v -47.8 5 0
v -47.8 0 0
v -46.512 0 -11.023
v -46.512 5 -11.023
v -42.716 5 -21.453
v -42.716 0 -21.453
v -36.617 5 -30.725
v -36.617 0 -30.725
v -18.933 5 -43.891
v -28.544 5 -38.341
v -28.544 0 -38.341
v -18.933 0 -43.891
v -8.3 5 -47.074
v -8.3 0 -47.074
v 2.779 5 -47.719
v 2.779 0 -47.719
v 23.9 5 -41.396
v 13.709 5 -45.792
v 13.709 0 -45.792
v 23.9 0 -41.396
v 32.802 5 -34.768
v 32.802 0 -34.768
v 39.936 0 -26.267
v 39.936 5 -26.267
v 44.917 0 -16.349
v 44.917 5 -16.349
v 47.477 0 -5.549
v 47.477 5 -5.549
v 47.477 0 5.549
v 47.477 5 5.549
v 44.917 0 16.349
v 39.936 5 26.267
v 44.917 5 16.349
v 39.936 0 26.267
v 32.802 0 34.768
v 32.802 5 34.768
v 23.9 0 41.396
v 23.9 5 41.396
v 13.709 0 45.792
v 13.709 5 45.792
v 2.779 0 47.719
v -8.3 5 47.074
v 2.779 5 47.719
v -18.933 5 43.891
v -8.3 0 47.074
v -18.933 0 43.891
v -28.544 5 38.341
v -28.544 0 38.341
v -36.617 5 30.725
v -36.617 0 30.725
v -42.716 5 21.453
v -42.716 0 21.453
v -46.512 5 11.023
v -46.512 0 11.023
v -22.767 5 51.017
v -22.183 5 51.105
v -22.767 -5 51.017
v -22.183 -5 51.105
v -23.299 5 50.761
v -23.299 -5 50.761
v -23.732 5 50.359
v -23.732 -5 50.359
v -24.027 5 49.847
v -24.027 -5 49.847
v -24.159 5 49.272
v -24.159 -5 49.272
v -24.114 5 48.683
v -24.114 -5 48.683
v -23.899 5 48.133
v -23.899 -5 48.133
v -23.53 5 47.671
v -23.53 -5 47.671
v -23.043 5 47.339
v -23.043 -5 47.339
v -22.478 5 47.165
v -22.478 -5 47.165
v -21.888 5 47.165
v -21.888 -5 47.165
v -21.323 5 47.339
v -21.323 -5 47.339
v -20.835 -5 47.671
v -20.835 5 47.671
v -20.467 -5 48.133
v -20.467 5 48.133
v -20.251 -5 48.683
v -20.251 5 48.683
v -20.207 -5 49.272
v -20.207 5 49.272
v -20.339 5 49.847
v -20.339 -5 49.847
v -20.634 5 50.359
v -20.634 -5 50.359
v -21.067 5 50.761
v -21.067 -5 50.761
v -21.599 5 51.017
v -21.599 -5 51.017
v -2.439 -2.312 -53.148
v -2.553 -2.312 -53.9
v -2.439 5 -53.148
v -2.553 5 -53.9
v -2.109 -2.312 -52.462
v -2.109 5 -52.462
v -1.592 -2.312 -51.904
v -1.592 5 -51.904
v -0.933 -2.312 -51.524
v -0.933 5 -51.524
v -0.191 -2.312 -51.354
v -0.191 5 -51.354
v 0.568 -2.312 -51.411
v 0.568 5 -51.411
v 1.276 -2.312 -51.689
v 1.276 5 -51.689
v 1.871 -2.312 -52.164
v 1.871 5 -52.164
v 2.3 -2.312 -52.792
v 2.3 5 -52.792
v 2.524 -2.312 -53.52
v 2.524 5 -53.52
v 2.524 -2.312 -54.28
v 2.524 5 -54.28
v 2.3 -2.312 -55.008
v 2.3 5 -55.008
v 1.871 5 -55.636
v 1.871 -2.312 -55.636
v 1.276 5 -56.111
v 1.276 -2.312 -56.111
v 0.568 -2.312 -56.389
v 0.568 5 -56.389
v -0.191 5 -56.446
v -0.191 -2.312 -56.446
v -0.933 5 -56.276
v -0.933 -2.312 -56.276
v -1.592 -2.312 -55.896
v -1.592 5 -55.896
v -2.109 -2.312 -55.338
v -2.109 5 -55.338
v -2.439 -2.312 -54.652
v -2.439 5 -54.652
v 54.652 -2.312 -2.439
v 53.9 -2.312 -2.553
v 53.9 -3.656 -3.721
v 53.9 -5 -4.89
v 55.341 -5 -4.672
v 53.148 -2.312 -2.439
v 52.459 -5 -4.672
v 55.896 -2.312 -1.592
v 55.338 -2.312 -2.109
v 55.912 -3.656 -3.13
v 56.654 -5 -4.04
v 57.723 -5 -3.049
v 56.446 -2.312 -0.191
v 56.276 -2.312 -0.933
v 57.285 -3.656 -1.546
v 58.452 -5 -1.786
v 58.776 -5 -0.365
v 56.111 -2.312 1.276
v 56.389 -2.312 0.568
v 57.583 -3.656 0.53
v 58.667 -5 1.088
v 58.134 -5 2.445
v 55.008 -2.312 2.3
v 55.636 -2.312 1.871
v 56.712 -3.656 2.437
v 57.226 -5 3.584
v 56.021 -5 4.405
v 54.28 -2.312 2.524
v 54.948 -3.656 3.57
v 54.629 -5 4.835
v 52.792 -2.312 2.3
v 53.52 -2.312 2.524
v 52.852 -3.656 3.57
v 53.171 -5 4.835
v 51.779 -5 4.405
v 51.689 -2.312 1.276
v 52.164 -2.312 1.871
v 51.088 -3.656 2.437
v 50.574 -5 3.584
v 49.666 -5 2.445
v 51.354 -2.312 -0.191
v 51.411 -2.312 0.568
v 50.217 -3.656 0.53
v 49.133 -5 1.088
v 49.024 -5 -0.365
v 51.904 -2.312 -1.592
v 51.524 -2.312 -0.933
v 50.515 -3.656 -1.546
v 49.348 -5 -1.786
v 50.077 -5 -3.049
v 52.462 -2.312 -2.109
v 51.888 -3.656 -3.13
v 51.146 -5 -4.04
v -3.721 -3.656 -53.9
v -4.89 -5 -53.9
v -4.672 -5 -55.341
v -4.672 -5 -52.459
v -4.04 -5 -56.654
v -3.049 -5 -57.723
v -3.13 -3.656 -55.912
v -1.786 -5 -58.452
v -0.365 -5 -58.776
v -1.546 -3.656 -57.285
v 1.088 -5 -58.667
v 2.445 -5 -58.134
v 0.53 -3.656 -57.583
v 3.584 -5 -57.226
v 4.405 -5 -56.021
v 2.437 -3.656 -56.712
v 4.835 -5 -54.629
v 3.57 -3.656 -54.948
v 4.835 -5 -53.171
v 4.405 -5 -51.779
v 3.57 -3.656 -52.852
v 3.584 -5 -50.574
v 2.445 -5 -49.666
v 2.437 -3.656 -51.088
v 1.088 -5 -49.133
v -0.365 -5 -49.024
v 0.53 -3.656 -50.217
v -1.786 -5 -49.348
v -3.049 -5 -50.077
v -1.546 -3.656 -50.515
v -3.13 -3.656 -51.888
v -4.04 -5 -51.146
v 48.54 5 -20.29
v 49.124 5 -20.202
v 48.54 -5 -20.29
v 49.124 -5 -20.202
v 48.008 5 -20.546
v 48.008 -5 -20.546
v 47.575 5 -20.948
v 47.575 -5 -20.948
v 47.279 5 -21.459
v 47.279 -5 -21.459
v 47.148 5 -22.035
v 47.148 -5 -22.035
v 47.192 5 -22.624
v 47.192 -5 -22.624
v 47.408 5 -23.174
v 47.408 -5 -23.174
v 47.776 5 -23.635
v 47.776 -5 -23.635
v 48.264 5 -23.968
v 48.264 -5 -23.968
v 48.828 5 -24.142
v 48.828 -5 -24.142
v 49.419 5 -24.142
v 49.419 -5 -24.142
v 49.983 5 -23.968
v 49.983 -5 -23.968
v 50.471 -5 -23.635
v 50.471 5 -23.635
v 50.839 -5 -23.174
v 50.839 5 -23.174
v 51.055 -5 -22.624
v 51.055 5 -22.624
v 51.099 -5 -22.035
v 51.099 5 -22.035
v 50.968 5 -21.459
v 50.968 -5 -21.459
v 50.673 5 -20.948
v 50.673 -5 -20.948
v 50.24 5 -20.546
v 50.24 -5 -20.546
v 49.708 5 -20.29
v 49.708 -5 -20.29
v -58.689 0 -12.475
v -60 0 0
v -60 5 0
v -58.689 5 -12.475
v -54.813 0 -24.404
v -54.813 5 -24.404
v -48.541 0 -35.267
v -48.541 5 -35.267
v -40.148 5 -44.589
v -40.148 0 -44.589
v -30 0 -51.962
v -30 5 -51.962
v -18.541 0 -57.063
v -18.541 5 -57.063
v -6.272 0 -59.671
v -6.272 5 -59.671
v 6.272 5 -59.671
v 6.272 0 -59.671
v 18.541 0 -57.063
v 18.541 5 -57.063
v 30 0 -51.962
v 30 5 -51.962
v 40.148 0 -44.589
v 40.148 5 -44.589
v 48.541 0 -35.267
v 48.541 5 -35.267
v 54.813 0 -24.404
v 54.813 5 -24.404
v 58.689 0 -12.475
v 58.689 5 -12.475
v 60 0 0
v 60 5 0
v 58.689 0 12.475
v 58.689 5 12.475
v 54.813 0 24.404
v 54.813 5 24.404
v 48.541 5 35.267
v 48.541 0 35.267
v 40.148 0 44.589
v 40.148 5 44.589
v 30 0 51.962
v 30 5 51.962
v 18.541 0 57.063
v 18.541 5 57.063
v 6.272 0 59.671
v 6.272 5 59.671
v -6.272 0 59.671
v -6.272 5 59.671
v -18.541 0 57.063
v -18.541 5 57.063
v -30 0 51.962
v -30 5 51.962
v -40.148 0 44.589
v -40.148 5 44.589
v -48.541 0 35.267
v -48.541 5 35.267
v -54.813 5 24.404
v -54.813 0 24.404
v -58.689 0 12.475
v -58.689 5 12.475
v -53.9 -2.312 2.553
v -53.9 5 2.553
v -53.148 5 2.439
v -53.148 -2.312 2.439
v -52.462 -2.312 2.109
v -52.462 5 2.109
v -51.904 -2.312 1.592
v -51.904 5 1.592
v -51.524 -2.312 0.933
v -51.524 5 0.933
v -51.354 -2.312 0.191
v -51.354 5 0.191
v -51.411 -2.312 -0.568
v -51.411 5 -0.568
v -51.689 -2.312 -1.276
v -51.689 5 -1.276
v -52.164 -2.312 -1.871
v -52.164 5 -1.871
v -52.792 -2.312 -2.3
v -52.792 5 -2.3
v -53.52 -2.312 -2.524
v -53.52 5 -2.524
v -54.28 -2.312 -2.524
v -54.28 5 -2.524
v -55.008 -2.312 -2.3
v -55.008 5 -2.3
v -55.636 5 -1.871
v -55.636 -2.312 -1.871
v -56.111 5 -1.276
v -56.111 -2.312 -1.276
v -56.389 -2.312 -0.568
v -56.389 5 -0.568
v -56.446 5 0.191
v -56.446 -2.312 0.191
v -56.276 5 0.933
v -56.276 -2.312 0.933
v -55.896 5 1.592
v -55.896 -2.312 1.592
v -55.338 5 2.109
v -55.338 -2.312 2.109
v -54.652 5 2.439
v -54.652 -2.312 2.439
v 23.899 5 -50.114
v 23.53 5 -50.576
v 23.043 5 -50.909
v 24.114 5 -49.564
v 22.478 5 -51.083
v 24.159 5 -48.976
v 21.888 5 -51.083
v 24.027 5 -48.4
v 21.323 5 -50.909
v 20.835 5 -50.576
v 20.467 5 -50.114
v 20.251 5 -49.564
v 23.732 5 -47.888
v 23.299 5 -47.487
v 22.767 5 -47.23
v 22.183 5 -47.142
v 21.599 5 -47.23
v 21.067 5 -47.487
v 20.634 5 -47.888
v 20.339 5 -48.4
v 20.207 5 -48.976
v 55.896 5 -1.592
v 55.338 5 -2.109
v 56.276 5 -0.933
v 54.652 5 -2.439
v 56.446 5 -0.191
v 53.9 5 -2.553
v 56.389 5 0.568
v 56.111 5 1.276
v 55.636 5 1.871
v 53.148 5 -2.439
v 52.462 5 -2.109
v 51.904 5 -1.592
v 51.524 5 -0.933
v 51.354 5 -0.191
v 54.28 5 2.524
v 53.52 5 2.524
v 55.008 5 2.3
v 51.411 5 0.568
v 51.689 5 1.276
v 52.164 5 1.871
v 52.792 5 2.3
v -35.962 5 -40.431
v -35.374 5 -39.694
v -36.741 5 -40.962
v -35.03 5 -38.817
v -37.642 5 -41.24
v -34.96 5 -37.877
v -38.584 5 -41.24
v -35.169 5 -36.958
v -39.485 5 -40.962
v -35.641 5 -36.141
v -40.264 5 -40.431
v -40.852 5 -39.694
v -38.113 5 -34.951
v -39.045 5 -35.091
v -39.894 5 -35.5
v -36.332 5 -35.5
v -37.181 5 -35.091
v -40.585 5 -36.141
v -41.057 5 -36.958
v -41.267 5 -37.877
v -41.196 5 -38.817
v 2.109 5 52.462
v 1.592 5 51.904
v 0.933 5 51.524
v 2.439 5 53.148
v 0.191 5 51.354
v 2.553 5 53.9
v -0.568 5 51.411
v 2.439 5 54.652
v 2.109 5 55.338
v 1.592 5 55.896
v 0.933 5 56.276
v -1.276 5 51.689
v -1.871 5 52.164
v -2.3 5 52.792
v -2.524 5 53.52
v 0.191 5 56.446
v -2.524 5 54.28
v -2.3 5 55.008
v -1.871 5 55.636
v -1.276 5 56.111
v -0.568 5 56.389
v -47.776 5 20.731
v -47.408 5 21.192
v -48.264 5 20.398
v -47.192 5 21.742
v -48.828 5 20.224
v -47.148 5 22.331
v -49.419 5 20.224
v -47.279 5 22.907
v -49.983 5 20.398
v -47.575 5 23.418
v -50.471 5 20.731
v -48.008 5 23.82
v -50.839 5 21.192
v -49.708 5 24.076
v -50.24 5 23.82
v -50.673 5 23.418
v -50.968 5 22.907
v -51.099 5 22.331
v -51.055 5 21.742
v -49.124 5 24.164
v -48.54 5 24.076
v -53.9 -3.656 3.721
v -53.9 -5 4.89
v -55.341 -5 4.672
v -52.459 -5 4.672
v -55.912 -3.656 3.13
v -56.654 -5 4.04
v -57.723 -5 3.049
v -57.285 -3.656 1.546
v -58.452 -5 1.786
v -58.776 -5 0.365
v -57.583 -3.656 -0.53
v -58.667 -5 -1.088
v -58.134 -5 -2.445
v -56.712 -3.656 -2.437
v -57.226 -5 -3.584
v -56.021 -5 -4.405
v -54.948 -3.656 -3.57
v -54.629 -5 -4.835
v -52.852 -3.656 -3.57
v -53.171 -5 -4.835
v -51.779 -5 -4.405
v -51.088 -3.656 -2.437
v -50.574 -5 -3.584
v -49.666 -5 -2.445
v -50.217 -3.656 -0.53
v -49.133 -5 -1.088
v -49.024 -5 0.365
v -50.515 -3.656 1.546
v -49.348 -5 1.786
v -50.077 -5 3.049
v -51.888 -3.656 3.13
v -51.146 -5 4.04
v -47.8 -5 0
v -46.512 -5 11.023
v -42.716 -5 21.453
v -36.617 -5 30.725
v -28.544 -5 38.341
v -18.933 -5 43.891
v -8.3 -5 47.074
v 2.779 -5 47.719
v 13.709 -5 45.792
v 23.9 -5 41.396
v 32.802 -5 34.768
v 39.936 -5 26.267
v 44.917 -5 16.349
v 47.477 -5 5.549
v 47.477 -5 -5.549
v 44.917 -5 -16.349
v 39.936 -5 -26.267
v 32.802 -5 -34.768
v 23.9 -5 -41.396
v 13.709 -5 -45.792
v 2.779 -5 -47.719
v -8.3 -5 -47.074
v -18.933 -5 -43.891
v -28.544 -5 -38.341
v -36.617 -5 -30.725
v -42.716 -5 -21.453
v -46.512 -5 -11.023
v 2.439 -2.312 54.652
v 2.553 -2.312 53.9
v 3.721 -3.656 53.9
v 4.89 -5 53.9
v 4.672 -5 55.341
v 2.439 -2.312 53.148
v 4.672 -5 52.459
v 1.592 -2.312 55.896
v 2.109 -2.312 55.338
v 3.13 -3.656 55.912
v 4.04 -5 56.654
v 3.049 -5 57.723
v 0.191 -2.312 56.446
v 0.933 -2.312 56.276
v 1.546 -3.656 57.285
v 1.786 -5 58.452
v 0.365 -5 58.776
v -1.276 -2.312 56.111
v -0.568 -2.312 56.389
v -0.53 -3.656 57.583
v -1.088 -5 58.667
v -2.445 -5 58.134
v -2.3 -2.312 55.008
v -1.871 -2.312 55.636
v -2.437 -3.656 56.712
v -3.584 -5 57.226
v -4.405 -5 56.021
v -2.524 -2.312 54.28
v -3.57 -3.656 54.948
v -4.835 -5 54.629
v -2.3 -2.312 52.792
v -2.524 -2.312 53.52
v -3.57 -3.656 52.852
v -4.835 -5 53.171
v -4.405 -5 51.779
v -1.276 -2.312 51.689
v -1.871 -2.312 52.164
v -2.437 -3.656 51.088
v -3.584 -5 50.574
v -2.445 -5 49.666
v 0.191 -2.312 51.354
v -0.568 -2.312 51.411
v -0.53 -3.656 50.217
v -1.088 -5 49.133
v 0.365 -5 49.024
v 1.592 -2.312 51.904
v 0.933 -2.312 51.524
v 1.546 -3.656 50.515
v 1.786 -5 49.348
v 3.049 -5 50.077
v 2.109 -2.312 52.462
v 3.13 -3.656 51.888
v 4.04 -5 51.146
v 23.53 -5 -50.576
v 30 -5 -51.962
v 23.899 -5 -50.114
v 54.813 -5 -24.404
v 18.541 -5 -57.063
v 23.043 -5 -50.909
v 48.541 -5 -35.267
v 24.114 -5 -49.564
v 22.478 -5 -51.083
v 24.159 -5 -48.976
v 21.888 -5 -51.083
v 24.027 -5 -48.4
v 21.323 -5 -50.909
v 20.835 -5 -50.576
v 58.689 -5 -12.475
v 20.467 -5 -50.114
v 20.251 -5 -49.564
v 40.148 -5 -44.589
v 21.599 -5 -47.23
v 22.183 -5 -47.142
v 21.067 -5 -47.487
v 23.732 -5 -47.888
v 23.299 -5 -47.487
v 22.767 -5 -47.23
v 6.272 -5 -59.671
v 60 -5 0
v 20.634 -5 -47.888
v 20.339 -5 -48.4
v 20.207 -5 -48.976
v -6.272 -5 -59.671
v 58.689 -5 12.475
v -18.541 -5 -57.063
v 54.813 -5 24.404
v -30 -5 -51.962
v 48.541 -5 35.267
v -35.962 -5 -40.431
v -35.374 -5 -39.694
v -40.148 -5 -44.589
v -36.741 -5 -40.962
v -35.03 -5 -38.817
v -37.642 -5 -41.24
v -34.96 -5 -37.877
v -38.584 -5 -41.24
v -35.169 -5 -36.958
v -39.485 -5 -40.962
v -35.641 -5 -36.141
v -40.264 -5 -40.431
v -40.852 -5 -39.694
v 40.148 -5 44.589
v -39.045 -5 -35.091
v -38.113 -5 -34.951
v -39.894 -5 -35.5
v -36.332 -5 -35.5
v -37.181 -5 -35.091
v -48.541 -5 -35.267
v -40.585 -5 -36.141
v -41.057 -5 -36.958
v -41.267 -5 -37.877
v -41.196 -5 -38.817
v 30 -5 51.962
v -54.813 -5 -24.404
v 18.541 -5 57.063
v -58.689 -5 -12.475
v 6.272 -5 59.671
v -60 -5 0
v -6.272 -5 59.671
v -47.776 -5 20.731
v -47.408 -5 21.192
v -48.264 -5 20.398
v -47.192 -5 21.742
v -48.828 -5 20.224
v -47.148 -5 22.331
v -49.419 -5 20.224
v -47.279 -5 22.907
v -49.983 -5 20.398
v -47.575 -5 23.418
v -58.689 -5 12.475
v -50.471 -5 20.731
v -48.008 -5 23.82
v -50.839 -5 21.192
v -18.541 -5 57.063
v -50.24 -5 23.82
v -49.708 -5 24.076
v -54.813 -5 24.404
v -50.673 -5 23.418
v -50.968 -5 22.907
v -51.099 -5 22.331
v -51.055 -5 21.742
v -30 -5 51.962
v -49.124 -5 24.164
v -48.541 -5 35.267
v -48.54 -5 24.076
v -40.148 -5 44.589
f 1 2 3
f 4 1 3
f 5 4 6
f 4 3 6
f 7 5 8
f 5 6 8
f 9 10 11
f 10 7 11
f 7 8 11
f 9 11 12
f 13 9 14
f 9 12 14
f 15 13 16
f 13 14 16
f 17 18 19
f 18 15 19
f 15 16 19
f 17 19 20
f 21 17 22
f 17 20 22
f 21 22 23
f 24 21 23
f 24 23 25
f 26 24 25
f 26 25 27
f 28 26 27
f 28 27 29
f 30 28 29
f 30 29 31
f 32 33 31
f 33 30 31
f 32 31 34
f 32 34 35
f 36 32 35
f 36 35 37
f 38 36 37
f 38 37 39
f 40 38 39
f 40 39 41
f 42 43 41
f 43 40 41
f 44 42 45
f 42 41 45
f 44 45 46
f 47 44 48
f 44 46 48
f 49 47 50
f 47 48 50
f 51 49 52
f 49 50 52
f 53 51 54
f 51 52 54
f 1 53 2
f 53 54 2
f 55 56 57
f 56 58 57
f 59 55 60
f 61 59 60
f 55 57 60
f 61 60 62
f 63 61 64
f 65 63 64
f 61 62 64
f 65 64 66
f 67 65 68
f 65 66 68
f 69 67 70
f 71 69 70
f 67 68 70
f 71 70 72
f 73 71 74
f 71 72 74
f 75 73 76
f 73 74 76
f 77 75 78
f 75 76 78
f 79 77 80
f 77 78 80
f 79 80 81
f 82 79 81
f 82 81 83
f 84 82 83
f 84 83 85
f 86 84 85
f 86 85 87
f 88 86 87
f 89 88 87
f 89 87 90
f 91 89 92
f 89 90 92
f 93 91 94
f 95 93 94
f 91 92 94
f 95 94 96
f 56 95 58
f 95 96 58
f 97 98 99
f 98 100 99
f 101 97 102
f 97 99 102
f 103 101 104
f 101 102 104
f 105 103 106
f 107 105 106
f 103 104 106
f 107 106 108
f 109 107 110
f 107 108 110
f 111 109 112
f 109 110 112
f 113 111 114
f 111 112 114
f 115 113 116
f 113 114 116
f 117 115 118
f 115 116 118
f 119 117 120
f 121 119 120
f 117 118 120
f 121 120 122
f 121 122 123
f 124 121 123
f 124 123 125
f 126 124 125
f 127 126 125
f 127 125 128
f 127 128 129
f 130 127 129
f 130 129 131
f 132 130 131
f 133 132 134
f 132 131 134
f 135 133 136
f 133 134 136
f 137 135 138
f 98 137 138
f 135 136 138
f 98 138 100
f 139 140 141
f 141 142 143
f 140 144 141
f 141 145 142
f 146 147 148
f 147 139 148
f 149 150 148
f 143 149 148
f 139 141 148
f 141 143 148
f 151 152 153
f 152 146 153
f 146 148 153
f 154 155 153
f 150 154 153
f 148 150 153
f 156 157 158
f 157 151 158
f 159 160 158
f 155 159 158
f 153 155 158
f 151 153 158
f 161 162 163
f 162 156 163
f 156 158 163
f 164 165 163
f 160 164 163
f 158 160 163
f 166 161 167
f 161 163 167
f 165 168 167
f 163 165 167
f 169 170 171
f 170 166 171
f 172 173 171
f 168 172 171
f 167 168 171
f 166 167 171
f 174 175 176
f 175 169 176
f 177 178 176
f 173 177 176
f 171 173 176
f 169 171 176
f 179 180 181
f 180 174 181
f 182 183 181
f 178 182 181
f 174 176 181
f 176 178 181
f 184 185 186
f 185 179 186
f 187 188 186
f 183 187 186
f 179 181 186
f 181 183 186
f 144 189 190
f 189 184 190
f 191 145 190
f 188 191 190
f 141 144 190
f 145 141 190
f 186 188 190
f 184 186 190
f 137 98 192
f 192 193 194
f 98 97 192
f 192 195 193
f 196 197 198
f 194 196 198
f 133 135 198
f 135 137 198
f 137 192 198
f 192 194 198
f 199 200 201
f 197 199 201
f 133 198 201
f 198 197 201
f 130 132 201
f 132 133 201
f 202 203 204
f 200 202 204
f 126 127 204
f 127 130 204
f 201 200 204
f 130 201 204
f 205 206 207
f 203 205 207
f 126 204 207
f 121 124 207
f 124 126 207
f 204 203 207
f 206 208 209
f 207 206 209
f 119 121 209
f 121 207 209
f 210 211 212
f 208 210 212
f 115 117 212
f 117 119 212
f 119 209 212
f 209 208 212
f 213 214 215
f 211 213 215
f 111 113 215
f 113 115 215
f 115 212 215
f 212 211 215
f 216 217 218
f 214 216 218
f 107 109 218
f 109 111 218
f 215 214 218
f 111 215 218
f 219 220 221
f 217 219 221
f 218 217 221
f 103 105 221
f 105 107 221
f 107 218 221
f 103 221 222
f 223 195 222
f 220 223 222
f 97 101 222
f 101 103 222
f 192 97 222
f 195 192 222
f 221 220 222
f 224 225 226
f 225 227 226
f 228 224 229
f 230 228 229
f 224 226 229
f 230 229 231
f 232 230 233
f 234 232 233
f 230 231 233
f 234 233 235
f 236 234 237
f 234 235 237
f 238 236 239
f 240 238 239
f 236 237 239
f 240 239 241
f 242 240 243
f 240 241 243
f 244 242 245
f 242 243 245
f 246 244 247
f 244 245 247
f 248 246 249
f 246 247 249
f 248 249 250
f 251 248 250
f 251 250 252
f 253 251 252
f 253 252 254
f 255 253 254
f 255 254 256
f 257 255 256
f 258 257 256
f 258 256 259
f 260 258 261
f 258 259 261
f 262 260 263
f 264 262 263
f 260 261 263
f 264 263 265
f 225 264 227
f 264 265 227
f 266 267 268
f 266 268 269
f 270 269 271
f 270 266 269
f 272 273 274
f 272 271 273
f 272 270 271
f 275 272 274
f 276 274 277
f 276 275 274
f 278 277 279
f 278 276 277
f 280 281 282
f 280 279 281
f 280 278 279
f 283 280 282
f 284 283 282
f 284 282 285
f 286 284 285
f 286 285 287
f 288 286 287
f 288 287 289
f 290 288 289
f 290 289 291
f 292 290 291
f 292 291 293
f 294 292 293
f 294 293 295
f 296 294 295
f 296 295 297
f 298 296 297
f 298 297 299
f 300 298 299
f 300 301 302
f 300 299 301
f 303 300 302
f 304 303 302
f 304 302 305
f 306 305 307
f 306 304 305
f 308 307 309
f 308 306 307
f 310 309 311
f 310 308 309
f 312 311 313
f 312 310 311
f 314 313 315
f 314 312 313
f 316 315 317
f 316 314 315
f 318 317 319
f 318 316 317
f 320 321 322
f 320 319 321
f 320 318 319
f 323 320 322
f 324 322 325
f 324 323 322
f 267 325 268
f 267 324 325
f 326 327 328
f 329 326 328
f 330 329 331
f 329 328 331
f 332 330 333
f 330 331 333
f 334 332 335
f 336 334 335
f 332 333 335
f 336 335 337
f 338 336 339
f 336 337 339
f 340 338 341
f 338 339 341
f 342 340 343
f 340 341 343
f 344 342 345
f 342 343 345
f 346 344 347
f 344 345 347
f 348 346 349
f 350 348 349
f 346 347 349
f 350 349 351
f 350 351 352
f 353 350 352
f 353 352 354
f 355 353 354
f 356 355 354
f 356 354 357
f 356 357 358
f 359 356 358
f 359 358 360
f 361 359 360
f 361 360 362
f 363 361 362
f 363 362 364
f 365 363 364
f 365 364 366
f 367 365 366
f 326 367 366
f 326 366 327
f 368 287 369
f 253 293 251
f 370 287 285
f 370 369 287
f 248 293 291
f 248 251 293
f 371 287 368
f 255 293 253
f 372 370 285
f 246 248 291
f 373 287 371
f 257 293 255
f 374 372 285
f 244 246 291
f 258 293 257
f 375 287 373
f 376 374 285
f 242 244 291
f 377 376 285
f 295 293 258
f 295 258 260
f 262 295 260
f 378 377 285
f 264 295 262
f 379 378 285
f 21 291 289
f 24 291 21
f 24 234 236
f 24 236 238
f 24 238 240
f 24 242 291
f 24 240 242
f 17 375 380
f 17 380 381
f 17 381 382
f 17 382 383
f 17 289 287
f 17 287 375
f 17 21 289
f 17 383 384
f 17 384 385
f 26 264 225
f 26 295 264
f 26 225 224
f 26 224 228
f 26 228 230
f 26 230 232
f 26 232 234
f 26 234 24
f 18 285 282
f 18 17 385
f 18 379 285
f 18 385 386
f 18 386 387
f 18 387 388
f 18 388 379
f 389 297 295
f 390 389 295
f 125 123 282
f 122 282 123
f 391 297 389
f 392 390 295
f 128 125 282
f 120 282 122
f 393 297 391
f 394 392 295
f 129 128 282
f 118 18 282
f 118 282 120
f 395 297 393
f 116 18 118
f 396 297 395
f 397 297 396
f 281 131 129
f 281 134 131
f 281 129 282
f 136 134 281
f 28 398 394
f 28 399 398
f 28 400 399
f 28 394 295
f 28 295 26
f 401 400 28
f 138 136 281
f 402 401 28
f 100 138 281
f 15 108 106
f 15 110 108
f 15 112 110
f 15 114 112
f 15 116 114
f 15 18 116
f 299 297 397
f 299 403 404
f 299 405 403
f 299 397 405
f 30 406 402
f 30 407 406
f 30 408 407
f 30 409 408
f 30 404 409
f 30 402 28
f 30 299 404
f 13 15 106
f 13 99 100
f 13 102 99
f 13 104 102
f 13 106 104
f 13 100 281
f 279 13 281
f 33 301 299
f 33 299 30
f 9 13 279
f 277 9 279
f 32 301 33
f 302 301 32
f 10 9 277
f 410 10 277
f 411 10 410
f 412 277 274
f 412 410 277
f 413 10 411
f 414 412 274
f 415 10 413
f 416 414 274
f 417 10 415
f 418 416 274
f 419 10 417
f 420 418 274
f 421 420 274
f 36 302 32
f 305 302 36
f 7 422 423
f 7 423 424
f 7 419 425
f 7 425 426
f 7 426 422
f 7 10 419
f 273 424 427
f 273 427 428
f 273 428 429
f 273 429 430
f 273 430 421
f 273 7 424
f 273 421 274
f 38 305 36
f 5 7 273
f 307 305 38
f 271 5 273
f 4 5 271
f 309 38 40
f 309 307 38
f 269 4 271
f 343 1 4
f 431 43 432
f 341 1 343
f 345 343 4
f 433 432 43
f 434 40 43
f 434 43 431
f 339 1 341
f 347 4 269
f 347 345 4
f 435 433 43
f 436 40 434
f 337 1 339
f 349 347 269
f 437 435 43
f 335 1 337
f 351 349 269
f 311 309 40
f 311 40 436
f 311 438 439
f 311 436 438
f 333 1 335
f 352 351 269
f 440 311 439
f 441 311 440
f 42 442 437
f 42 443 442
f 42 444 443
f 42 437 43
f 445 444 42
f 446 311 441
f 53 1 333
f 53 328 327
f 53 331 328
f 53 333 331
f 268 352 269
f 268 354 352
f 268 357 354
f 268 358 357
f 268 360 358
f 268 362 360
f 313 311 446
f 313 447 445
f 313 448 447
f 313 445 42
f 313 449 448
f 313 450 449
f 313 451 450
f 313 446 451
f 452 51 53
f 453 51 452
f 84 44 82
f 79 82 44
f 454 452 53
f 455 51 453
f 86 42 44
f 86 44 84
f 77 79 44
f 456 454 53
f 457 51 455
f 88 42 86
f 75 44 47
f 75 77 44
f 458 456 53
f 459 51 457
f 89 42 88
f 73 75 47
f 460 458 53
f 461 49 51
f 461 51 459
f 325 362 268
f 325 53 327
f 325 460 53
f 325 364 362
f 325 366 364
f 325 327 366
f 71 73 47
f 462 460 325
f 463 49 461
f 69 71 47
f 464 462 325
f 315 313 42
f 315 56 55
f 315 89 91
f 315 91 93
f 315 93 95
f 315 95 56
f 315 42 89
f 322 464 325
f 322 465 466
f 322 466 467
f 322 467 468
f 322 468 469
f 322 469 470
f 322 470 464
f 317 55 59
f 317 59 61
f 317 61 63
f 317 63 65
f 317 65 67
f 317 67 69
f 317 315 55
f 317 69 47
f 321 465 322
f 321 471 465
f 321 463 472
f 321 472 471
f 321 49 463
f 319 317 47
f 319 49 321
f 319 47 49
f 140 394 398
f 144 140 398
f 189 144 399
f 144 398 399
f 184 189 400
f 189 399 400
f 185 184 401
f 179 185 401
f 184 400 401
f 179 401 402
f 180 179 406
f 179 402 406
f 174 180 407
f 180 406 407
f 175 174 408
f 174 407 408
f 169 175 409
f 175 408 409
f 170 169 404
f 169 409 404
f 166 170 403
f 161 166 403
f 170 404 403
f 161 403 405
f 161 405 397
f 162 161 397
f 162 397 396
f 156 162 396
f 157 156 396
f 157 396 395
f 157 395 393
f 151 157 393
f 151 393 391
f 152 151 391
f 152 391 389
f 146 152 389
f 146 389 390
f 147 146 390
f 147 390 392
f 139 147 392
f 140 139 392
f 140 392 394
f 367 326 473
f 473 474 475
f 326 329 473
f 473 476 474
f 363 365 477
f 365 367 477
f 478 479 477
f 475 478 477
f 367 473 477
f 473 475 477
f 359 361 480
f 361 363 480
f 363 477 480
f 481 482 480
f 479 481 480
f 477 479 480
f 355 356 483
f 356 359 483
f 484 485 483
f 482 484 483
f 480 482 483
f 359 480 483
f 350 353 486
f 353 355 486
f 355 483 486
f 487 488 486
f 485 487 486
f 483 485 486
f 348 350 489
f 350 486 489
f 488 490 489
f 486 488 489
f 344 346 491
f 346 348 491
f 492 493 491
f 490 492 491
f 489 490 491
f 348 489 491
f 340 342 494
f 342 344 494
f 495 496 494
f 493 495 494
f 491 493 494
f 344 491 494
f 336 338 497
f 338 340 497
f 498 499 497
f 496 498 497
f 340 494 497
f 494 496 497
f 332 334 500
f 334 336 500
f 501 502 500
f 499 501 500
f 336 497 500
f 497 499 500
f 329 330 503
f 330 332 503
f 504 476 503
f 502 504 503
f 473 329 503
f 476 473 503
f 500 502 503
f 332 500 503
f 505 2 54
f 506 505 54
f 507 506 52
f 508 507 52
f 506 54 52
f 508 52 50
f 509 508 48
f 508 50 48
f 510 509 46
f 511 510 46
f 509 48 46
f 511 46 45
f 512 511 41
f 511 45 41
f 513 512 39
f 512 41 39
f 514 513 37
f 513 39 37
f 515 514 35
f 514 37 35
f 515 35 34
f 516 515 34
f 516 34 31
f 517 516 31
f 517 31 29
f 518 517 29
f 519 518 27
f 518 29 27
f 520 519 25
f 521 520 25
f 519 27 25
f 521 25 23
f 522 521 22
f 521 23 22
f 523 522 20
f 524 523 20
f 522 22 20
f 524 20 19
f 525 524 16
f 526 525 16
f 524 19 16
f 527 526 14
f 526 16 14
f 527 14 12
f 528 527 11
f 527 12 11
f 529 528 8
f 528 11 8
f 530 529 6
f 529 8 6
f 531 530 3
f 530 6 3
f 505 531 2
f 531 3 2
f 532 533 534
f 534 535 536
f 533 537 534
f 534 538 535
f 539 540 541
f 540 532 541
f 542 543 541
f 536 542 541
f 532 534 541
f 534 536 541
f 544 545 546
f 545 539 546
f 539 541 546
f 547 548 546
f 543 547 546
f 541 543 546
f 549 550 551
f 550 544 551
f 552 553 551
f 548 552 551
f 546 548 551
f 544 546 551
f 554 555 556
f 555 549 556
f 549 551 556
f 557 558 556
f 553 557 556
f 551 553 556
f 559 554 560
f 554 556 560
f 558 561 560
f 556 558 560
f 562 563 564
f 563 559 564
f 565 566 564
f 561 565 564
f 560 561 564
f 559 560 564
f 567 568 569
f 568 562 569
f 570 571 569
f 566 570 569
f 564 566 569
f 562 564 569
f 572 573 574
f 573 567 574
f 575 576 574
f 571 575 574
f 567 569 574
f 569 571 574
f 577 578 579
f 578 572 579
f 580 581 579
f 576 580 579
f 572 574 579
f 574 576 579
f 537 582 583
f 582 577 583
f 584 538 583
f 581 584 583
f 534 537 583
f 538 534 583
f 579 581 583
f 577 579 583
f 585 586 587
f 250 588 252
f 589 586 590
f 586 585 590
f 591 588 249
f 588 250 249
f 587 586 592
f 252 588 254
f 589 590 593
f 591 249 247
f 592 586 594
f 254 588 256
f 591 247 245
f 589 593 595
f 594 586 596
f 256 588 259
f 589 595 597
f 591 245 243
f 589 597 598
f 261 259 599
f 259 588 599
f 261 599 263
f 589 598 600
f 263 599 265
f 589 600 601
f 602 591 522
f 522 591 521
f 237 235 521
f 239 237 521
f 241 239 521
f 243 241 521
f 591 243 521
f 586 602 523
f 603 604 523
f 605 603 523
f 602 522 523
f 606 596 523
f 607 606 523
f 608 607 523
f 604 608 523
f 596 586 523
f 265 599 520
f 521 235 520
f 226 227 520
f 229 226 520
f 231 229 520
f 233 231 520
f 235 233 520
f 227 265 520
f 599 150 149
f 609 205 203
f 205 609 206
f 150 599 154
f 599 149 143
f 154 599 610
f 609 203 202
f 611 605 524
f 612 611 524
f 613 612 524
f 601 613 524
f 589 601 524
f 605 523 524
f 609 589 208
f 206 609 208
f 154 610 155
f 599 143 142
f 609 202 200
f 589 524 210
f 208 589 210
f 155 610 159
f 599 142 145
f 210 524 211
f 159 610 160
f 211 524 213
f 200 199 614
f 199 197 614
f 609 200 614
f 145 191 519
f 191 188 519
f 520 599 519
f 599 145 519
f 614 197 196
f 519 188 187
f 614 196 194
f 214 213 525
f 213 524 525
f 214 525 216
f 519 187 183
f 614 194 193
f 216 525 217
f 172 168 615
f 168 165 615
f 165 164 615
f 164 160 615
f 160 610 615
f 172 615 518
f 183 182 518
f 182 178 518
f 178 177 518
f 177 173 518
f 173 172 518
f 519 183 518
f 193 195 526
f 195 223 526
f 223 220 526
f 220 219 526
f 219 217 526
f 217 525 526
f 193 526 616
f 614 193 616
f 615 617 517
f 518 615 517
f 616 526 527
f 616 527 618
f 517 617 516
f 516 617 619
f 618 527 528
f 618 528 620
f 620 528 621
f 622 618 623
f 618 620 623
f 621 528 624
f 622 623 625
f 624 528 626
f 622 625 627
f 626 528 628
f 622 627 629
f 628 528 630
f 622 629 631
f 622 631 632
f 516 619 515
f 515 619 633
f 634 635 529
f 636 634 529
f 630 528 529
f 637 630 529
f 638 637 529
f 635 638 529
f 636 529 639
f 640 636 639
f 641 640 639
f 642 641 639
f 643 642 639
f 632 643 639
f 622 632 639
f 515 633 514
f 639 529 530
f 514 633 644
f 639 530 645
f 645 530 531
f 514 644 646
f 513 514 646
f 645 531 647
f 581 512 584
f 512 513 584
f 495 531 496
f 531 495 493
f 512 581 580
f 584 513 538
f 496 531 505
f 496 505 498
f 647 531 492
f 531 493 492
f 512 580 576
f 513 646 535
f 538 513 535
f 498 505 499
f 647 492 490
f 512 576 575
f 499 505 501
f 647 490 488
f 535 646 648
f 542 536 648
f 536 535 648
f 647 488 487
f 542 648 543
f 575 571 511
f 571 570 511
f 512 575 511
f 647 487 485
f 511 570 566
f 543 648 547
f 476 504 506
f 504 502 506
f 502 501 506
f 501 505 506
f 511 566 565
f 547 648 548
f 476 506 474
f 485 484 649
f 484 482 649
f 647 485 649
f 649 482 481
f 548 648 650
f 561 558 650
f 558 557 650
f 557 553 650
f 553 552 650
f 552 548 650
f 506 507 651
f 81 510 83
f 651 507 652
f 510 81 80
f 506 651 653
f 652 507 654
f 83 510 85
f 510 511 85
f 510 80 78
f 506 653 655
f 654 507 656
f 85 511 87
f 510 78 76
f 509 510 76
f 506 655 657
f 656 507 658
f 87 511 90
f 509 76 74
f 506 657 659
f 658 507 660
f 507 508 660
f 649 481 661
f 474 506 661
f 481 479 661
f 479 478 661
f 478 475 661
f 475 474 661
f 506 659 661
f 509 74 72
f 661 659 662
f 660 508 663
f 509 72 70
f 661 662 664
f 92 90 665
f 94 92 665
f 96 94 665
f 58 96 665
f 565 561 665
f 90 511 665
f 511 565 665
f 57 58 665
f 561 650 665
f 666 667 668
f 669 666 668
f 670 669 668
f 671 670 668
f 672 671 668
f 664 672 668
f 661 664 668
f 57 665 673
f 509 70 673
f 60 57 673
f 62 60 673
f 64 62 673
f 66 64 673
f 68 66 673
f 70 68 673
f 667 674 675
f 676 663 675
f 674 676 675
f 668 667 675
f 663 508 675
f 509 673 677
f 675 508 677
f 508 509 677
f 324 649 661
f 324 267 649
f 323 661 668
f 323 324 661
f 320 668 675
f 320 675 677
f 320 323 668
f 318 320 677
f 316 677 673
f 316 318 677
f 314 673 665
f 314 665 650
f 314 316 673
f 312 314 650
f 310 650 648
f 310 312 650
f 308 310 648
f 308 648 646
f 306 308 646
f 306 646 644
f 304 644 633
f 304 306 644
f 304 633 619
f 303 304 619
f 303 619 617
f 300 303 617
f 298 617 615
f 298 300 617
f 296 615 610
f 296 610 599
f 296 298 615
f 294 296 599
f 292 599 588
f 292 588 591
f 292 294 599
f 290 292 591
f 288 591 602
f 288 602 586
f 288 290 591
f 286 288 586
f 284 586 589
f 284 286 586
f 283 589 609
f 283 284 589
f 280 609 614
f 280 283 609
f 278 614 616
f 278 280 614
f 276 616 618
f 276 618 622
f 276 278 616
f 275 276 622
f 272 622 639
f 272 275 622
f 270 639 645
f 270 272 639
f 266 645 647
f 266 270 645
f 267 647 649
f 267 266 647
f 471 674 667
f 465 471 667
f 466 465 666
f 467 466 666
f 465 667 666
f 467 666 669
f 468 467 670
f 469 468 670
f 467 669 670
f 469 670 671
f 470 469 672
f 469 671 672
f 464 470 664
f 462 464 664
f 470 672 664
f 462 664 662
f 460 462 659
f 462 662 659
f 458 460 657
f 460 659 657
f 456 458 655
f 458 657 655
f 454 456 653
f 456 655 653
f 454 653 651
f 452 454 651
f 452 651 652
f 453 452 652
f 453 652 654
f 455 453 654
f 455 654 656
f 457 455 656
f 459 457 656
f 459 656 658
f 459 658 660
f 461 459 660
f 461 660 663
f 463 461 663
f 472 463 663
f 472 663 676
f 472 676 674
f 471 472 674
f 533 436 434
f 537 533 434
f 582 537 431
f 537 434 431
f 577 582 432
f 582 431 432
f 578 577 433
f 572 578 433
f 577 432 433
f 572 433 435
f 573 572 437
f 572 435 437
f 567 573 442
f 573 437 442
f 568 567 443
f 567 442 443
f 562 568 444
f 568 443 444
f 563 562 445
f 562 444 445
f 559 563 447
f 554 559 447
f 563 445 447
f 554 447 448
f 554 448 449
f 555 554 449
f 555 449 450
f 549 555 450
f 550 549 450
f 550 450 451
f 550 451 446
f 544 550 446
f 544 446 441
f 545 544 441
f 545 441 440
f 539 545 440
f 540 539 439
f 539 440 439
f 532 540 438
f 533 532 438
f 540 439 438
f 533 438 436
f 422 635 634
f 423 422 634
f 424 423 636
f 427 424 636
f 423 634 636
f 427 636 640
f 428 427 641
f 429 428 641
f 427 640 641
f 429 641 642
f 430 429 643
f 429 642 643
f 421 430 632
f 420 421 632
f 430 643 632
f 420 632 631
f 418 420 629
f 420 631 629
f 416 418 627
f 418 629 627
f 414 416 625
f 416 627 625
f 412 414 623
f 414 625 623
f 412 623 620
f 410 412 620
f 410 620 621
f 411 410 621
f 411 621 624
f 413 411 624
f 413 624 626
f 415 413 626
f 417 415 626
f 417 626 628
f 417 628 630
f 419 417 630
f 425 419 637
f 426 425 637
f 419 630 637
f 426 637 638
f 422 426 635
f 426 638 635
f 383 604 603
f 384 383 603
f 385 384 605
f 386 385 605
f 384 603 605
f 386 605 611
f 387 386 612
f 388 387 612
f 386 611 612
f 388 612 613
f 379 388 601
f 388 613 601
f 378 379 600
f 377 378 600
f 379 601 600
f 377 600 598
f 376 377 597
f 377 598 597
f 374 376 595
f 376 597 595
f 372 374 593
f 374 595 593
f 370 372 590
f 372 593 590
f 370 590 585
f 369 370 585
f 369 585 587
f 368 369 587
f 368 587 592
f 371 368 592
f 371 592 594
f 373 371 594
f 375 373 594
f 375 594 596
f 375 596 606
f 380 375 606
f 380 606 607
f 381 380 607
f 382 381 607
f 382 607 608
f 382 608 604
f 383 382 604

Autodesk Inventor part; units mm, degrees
ref_plane "YZ Plane" through (0, 0, 0) normal (1, 0, 0) x (0, 1, 0)
ref_plane "XZ Plane" through (0, 0, 0) normal (0, 1, 0) x (-1, 0, 0)
ref_plane "XY Plane" through (0, 0, 0) normal (0, 0, 1) x (1, 0, 0)
sketch "Sketch1" plane through (0, 0, 0) normal (0, 1, 0) x (-1, 0, 0)
  circle A0 centre (0, 0) radius 35 construction
  circle A1 centre (0, 0) radius 47.8
  circle A2 centre (0, 0) radius 60
  line L0 (0, -35) -> (0, -60) construction
  point P0 (0, -47.5)
  dimension "d0" = 70
  dimension "d1" = 120
  dimension "d42" = 12.2
extrude "Extrusion1" add sketch "Sketch1" along normal mid plane 10
sketch "Sketch3" plane through (0, -5, 0) normal (0, -1, 0) x (1, 0, 0)
  circle A0 centre (0, 0) radius 47.8 construction
  circle A1 centre (0, 0) radius 60 construction
  circle A2 centre (0, 0) radius 47.8 construction
  line L0 (47.8, 0) -> (60, 0) construction
  circle A3 centre (0, 0) radius 47.8 construction
  circle A4 centre (0, 0) radius 60 construction
  point P0 (53.9, 0)
  dimension "d43" = 120
  dimension "d44" = 53.9
hole "Hole2" at (53.9, -5, 0) direction (0, 1, 0) diameter 5.1054 end through all countersink diameter 9.779 countersink angle 82 clearance for "Flat Head Machine Screw (82)" size "#10" standard "Ansi Unified Screw Threads"
pattern_circular "Circular Pattern2" count 4 over 360 about axis through (0, 0, 0) along (0, 1, 0) of "Hole2"
sketch "Sketch4" plane through (0, 5, 0) normal (0, 1, 0) x (1, 0, 0)
  line L0 (22.1829, 49.1236) -> (-49.1236, -22.1829) construction
  line L1 (-49.1236, -22.1829) -> (-22.1829, -49.1236) construction
  line L2 (-22.1829, -49.1236) -> (49.1236, 22.1829) construction
  line L3 (49.1236, 22.1829) -> (22.1829, 49.1236) construction
  line L4 (22.1829, 49.1236) -> (-22.1829, -49.1236) construction
  line L5 (-49.1236, -22.1829) -> (49.1236, 22.1829) construction
  circle A0 centre (0, -53.9) radius 2.5527 construction
  circle A1 centre (-53.9, 0) radius 2.5527 construction
  circle A2 centre (0, 53.9) radius 2.5527 construction
  circle A3 centre (53.9, 0) radius 2.5527 construction
  circle A4 centre (0, 0) radius 47.8 construction
  circle A5 centre (0, 0) radius 60 construction
  circle A6 centre (0, 53.9) radius 2.5527 construction
  circle A7 centre (0, 0) radius 53.9 construction
  circle A8 centre (53.9, 0) radius 2.5527 construction
  line L6 (0, 0) -> (53.9, 0) construction
  point P0 (49.1236, 22.1829)
  point P1 (-49.1236, -22.1829)
  dimension "d25" = 38.1
  dimension "d26" = 45
hole "Hole3" at (22.1829, 5, -49.1236) at (49.1236, 5, -22.1829) at (-49.1236, 5, 22.1829) at (-22.1829, 5, 49.1236) direction (0, -1, 0) diameter 3.9624 end through all thread size "10-32 UNF" class "2B" standard "ANSI Unified Screw Threads"
sketch "Sketch5" plane through (0, 5, 0) normal (0, 1, 0) x (1, 0, 0)
  circle A0 centre (0, 0) radius 60 construction
  line L0 (-42.4264, 42.4264) -> (-33.7997, 33.7997) construction
  circle A1 centre (0, 0) radius 47.8 construction
  circle A2 centre (-53.9, 0) radius 2.5527 construction
  circle A3 centre (53.9, 0) radius 2.5527 construction
  line L1 (-53.9, 0) -> (53.9, 0) construction
  point P0 (-38.1131, 38.1131)
  point P1 (-38.1131, 38.1131)
  dimension "d34" = 45
hole "Hole4" at (-38.1131, 5, -38.1131) direction (0, -1, 0) diameter 6.3246 end through all
properties part number "4in LS-002" material "Aluminum 6061"
